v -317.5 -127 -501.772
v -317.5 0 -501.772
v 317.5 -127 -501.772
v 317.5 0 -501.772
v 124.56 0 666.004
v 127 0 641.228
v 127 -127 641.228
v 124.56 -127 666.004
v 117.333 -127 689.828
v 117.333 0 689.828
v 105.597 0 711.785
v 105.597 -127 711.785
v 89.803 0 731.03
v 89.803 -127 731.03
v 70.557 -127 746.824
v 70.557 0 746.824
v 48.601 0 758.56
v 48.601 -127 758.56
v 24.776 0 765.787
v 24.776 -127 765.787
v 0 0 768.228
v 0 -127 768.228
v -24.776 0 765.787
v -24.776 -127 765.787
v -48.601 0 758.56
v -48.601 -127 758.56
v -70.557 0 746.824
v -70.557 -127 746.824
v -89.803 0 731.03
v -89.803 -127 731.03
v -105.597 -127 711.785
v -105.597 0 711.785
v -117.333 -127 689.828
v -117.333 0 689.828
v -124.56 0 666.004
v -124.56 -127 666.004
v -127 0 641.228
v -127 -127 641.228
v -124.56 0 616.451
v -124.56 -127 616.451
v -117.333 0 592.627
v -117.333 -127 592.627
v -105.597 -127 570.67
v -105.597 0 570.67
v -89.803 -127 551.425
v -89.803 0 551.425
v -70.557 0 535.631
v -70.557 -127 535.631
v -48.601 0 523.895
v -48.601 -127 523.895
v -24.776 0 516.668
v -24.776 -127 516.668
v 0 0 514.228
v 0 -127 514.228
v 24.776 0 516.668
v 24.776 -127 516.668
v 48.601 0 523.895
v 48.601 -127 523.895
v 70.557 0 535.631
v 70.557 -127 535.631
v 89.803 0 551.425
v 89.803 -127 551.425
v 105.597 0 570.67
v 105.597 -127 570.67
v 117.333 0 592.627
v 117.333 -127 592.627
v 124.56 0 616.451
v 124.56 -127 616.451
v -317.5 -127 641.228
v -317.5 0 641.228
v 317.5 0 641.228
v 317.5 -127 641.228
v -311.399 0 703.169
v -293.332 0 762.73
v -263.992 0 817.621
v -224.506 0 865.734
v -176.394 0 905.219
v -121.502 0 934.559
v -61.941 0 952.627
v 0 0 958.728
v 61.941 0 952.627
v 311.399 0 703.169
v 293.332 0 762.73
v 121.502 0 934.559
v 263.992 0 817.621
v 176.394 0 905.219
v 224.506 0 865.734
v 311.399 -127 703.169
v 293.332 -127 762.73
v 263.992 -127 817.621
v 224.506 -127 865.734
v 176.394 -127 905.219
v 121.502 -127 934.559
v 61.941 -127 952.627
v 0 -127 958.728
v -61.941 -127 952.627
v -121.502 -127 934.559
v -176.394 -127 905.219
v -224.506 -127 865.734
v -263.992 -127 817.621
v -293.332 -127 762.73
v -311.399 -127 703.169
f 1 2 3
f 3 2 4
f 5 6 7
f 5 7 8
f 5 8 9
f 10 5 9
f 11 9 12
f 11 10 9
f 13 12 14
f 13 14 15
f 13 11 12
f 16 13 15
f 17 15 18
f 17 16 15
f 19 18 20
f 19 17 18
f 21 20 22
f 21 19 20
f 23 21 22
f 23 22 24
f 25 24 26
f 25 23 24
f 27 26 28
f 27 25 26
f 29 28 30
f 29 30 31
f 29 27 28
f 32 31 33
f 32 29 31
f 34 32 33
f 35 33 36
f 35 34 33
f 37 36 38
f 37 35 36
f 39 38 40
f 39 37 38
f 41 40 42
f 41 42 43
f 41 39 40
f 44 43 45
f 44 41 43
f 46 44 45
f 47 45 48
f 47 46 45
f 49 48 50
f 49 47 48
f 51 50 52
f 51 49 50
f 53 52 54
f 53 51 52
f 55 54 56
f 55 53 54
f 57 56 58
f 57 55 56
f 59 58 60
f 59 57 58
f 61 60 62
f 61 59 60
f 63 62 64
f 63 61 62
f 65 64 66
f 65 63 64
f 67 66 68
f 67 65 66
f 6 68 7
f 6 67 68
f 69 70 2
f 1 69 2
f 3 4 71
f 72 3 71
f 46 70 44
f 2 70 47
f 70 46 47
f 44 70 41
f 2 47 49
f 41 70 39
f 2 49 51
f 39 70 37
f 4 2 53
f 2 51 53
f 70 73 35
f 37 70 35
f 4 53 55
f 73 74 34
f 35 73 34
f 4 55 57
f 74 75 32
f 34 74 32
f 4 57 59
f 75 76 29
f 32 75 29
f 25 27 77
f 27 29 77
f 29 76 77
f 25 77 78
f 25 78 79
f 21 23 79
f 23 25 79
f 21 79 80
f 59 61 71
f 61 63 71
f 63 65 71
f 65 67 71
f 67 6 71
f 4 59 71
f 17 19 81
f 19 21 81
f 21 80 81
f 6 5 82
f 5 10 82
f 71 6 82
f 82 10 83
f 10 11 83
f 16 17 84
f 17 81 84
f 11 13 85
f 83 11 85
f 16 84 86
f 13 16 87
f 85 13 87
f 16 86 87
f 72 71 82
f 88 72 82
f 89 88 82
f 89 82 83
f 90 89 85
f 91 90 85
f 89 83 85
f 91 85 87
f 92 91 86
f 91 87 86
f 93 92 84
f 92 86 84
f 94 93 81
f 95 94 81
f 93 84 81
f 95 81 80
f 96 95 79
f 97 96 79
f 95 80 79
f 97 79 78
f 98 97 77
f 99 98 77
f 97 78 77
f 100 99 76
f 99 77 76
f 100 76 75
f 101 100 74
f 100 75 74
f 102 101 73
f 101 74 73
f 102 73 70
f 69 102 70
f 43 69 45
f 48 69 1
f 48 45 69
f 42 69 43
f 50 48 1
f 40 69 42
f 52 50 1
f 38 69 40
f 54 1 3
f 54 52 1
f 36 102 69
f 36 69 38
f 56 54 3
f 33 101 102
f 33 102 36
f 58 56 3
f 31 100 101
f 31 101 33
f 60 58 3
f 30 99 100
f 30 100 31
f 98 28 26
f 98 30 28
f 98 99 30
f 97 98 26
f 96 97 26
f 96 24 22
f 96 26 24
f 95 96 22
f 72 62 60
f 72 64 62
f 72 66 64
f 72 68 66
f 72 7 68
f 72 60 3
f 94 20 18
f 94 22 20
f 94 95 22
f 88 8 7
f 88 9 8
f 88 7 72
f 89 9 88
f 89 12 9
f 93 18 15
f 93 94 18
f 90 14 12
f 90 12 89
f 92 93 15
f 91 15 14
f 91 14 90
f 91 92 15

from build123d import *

# Parameters (mm, degrees)
F0_R     = 127
F1_DEPTH = 127


with BuildPart() as f1:
    # F0 (on Front) → F1 (new body)
    with BuildSketch(Plane.XZ):
        with BuildLine():
            ThreePointArc((-317.5, 641.227615), (0, 323.727615), (317.5, 641.227615))
            ThreePointArc((317.5, 641.227615), (0, 958.727615), (-317.5, 641.227615))
        make_face()
        with Locations((0, 641.227615)):
            Circle(F0_R, mode=Mode.SUBTRACT)
        with BuildLine():
            Line((317.5, -501.772385), (317.5, 641.227615))
            ThreePointArc((317.5, 641.227615), (0, 323.727615), (-317.5, 641.227615))
            Line((-317.5, 641.227615), (-317.5, -501.772385))
            Line((-317.5, -501.772385), (317.5, -501.772385))
        make_face()
    extrude(amount=F1_DEPTH)


solid = f1.part
